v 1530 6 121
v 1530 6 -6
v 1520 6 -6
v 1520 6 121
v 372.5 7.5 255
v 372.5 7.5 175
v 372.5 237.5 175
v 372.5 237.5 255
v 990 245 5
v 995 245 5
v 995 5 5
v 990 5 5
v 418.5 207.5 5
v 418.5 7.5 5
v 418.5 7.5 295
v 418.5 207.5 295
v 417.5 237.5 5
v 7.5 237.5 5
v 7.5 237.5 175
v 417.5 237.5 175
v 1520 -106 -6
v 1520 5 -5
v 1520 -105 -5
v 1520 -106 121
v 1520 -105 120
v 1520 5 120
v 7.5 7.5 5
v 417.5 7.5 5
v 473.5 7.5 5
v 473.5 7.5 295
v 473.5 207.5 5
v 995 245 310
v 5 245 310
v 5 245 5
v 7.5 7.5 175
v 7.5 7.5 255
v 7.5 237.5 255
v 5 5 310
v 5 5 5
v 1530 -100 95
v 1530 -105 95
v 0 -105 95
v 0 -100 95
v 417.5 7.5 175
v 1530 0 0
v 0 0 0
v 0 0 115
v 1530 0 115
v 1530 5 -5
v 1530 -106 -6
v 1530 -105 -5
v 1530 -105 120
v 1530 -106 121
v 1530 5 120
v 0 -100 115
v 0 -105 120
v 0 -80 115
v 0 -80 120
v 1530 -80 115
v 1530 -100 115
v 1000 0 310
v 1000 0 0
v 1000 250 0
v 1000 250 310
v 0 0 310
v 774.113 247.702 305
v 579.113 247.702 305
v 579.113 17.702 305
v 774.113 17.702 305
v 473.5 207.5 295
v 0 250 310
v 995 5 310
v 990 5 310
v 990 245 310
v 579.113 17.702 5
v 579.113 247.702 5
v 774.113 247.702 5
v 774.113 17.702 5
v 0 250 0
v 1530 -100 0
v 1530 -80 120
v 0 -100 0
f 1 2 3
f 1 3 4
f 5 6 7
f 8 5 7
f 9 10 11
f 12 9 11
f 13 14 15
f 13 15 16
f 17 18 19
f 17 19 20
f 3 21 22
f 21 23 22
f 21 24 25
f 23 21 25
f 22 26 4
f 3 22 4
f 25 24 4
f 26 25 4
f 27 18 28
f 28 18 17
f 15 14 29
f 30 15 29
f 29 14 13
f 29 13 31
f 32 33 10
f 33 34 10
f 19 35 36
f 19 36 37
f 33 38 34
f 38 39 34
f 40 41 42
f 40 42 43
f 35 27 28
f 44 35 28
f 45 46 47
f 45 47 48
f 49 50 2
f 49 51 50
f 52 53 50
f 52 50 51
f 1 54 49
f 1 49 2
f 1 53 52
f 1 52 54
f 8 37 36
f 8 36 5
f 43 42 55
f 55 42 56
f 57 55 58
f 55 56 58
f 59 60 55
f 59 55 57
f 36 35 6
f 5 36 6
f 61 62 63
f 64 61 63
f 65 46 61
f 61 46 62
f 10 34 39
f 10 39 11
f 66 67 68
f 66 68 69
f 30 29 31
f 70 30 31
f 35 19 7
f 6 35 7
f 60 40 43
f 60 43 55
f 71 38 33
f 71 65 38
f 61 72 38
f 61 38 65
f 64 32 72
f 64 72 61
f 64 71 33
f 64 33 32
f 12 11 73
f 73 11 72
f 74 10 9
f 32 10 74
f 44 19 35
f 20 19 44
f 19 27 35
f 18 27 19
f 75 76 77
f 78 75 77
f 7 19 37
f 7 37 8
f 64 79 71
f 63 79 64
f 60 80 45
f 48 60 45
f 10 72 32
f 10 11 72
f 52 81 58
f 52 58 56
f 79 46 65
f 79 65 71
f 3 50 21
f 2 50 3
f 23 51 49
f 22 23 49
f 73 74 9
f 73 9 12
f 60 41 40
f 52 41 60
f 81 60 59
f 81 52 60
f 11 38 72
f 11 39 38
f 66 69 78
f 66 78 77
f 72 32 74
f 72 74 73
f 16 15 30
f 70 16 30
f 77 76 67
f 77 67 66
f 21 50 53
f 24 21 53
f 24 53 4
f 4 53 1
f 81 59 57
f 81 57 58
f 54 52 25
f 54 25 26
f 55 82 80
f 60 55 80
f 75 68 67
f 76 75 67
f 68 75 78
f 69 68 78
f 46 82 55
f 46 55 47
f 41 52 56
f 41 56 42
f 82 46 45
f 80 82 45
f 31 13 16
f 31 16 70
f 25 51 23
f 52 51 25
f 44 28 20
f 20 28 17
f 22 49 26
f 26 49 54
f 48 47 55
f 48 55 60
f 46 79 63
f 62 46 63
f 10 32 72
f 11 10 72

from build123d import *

# Parameters (mm, degrees)
F0_W      = 1000
F0_H      = 250
F1_DEPTH  = 310
F2_T      = -5
F3_W      = 410
F3_H      = 230
F4_DEPTH  = 170
F5_W      = 365
F5_H      = 230
F6_DEPTH  = 80
F7_W      = 55
F7_H      = 200
F8_DEPTH  = 290
F9_W      = 195
F9_H      = 230
F10_DEPTH = 300
F11_W     = 1530
F11_H     = 100
F12_DEPTH = 115
F13_W     = 240
F13_H     = 305
F14_DEPTH = 5
F16_DEPTH = 1530
F17_W     = 112
F17_H     = 127
F17_W_2   = 110
F17_H_2   = 125
F18_DEPTH = 10


with BuildPart() as f1:
    # F0 (on Top) → F1 (new body)
    with BuildSketch(Plane.XY):
        with Locations((500, 125)):
            Rectangle(F0_W, F0_H)
    extrude(amount=F1_DEPTH)

    # F2
    f2_openings = [f1.faces().sort_by_distance(p)[0] for p in [
        (500, 125, 310),
    ]]
    offset(amount=F2_T, openings=f2_openings)


with BuildPart() as f4:
    # F3 (on face) → F4 (new body)
    with BuildSketch(Plane.XY.offset(5)):
        with Locations((212.5, 122.5)):
            Rectangle(F3_W, F3_H)
    extrude(amount=F4_DEPTH)


with BuildPart() as f6:
    # F5 (on face) → F6 (new body)
    with BuildSketch(Plane.XY.offset(175)):
        with Locations((190, 122.5)):
            Rectangle(F5_W, F5_H)
    extrude(amount=F6_DEPTH)


with BuildPart() as f8:
    # F7 (on face) → F8 (new body)
    with BuildSketch(Plane.XY.offset(5)):
        with Locations((446, 107.5)):
            Rectangle(F7_W, F7_H)
    extrude(amount=F8_DEPTH)


with BuildPart() as f10:
    # F9 (on face) → F10 (new body)
    with BuildSketch(Plane.XY.offset(5)):
        with Locations((676.612673, 132.701575)):
            Rectangle(F9_W, F9_H)
    extrude(amount=F10_DEPTH)


with BuildPart() as f12:
    # F11 (on Top) → F12 (new body)
    with BuildSketch(Plane.XY):
        with Locations((765, -50)):
            Rectangle(F11_W, F11_H)
    extrude(amount=F12_DEPTH)


with BuildPart() as f14:
    # F13 (on face) → F14 (new body)
    with BuildSketch(Plane(origin=(995, 0, 0), x_dir=(0, -1, 0), z_dir=(-1, 0, 0))):
        with Locations((-125, 157.5)):
            Rectangle(F13_W, F13_H)
    extrude(amount=F14_DEPTH)


with BuildPart() as f16:
    # F15 (on face) → F16 (new body, through all)
    with BuildSketch(Plane.YZ.offset(1530)):
        Polygon((-100, 95), (-100, 115), (-80, 115), (-80, 120), (-105, 120), (-105, 95), align=None)
    extrude(amount=-F16_DEPTH)


with BuildPart() as f18:
    # F17 (on face) → F18 (new body)
    with BuildSketch(Plane.YZ.offset(1530)):
        with Locations((-50, 57.5)):
            Rectangle(F17_W, F17_H)
        with Locations((-50, 57.5)):
            Rectangle(F17_W_2, F17_H_2, mode=Mode.SUBTRACT)
    extrude(amount=-F18_DEPTH)


solid = Compound([f1.part, f4.part, f6.part, f8.part, f10.part, f12.part, f14.part, f16.part, f18.part])
